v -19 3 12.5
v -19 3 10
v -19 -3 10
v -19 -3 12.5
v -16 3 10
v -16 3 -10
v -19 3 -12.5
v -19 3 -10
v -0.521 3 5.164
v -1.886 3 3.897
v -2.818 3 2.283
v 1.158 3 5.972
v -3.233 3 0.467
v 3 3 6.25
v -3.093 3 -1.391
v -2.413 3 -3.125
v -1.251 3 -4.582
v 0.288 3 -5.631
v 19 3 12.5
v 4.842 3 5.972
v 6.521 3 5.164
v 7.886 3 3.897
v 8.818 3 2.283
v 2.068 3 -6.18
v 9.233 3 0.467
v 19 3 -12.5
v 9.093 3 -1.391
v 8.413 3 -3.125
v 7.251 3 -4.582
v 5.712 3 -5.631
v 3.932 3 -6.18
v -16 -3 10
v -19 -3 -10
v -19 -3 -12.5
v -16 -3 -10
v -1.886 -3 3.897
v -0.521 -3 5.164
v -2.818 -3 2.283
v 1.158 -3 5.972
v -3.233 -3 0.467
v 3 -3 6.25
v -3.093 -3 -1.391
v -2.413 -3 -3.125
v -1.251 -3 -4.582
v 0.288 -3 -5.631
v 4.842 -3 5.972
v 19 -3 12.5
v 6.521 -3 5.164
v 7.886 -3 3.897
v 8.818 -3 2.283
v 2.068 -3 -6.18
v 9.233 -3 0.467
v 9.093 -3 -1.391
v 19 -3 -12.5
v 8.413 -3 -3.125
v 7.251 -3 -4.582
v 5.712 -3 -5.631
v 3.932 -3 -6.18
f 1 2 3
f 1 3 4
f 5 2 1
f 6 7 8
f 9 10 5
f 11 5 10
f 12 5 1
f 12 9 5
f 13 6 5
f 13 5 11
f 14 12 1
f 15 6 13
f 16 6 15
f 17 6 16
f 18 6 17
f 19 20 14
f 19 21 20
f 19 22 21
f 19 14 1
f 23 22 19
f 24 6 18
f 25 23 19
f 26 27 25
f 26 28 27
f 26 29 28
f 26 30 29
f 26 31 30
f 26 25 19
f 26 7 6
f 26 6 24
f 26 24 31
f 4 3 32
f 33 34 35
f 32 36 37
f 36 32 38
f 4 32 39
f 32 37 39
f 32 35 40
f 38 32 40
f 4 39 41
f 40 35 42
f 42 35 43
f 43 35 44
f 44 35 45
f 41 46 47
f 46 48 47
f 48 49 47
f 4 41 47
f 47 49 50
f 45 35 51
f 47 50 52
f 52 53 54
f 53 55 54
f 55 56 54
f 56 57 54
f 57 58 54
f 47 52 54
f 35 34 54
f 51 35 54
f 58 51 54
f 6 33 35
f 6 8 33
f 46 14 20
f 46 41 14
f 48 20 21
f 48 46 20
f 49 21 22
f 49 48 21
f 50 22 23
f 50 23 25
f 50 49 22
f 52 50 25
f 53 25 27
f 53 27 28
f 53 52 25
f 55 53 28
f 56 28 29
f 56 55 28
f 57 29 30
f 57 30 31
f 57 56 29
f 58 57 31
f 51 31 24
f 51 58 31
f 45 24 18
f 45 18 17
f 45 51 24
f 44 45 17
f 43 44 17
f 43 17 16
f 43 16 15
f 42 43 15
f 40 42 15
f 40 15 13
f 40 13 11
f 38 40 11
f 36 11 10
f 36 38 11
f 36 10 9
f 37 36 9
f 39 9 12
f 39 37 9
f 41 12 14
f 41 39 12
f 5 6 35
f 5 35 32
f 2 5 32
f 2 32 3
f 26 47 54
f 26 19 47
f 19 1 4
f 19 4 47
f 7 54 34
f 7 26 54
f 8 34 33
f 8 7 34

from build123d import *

# Parameters (mm, degrees)
SKETCH1_R           = 6.25
BOSS_EXTRUDE1_DEPTH = 3


with BuildPart() as part:
    # Sketch1 → Boss-Extrude1 (new, symmetric)
    with BuildSketch(Plane(origin=(0, 0, 0), x_dir=(1, 0, 0), z_dir=(0, 1, 0))):
        Polygon((-19, 10), (-16, 10), (-16, -10), (-19, -10), (-19, -12.5), (19, -12.5), (19, 12.5), (-19, 12.5), align=None)
        with Locations(Location((3, 0, 0), (0, 0, 270))):
            Circle(SKETCH1_R, mode=Mode.SUBTRACT)
    extrude(amount=BOSS_EXTRUDE1_DEPTH, both=True)


solid = part.part
